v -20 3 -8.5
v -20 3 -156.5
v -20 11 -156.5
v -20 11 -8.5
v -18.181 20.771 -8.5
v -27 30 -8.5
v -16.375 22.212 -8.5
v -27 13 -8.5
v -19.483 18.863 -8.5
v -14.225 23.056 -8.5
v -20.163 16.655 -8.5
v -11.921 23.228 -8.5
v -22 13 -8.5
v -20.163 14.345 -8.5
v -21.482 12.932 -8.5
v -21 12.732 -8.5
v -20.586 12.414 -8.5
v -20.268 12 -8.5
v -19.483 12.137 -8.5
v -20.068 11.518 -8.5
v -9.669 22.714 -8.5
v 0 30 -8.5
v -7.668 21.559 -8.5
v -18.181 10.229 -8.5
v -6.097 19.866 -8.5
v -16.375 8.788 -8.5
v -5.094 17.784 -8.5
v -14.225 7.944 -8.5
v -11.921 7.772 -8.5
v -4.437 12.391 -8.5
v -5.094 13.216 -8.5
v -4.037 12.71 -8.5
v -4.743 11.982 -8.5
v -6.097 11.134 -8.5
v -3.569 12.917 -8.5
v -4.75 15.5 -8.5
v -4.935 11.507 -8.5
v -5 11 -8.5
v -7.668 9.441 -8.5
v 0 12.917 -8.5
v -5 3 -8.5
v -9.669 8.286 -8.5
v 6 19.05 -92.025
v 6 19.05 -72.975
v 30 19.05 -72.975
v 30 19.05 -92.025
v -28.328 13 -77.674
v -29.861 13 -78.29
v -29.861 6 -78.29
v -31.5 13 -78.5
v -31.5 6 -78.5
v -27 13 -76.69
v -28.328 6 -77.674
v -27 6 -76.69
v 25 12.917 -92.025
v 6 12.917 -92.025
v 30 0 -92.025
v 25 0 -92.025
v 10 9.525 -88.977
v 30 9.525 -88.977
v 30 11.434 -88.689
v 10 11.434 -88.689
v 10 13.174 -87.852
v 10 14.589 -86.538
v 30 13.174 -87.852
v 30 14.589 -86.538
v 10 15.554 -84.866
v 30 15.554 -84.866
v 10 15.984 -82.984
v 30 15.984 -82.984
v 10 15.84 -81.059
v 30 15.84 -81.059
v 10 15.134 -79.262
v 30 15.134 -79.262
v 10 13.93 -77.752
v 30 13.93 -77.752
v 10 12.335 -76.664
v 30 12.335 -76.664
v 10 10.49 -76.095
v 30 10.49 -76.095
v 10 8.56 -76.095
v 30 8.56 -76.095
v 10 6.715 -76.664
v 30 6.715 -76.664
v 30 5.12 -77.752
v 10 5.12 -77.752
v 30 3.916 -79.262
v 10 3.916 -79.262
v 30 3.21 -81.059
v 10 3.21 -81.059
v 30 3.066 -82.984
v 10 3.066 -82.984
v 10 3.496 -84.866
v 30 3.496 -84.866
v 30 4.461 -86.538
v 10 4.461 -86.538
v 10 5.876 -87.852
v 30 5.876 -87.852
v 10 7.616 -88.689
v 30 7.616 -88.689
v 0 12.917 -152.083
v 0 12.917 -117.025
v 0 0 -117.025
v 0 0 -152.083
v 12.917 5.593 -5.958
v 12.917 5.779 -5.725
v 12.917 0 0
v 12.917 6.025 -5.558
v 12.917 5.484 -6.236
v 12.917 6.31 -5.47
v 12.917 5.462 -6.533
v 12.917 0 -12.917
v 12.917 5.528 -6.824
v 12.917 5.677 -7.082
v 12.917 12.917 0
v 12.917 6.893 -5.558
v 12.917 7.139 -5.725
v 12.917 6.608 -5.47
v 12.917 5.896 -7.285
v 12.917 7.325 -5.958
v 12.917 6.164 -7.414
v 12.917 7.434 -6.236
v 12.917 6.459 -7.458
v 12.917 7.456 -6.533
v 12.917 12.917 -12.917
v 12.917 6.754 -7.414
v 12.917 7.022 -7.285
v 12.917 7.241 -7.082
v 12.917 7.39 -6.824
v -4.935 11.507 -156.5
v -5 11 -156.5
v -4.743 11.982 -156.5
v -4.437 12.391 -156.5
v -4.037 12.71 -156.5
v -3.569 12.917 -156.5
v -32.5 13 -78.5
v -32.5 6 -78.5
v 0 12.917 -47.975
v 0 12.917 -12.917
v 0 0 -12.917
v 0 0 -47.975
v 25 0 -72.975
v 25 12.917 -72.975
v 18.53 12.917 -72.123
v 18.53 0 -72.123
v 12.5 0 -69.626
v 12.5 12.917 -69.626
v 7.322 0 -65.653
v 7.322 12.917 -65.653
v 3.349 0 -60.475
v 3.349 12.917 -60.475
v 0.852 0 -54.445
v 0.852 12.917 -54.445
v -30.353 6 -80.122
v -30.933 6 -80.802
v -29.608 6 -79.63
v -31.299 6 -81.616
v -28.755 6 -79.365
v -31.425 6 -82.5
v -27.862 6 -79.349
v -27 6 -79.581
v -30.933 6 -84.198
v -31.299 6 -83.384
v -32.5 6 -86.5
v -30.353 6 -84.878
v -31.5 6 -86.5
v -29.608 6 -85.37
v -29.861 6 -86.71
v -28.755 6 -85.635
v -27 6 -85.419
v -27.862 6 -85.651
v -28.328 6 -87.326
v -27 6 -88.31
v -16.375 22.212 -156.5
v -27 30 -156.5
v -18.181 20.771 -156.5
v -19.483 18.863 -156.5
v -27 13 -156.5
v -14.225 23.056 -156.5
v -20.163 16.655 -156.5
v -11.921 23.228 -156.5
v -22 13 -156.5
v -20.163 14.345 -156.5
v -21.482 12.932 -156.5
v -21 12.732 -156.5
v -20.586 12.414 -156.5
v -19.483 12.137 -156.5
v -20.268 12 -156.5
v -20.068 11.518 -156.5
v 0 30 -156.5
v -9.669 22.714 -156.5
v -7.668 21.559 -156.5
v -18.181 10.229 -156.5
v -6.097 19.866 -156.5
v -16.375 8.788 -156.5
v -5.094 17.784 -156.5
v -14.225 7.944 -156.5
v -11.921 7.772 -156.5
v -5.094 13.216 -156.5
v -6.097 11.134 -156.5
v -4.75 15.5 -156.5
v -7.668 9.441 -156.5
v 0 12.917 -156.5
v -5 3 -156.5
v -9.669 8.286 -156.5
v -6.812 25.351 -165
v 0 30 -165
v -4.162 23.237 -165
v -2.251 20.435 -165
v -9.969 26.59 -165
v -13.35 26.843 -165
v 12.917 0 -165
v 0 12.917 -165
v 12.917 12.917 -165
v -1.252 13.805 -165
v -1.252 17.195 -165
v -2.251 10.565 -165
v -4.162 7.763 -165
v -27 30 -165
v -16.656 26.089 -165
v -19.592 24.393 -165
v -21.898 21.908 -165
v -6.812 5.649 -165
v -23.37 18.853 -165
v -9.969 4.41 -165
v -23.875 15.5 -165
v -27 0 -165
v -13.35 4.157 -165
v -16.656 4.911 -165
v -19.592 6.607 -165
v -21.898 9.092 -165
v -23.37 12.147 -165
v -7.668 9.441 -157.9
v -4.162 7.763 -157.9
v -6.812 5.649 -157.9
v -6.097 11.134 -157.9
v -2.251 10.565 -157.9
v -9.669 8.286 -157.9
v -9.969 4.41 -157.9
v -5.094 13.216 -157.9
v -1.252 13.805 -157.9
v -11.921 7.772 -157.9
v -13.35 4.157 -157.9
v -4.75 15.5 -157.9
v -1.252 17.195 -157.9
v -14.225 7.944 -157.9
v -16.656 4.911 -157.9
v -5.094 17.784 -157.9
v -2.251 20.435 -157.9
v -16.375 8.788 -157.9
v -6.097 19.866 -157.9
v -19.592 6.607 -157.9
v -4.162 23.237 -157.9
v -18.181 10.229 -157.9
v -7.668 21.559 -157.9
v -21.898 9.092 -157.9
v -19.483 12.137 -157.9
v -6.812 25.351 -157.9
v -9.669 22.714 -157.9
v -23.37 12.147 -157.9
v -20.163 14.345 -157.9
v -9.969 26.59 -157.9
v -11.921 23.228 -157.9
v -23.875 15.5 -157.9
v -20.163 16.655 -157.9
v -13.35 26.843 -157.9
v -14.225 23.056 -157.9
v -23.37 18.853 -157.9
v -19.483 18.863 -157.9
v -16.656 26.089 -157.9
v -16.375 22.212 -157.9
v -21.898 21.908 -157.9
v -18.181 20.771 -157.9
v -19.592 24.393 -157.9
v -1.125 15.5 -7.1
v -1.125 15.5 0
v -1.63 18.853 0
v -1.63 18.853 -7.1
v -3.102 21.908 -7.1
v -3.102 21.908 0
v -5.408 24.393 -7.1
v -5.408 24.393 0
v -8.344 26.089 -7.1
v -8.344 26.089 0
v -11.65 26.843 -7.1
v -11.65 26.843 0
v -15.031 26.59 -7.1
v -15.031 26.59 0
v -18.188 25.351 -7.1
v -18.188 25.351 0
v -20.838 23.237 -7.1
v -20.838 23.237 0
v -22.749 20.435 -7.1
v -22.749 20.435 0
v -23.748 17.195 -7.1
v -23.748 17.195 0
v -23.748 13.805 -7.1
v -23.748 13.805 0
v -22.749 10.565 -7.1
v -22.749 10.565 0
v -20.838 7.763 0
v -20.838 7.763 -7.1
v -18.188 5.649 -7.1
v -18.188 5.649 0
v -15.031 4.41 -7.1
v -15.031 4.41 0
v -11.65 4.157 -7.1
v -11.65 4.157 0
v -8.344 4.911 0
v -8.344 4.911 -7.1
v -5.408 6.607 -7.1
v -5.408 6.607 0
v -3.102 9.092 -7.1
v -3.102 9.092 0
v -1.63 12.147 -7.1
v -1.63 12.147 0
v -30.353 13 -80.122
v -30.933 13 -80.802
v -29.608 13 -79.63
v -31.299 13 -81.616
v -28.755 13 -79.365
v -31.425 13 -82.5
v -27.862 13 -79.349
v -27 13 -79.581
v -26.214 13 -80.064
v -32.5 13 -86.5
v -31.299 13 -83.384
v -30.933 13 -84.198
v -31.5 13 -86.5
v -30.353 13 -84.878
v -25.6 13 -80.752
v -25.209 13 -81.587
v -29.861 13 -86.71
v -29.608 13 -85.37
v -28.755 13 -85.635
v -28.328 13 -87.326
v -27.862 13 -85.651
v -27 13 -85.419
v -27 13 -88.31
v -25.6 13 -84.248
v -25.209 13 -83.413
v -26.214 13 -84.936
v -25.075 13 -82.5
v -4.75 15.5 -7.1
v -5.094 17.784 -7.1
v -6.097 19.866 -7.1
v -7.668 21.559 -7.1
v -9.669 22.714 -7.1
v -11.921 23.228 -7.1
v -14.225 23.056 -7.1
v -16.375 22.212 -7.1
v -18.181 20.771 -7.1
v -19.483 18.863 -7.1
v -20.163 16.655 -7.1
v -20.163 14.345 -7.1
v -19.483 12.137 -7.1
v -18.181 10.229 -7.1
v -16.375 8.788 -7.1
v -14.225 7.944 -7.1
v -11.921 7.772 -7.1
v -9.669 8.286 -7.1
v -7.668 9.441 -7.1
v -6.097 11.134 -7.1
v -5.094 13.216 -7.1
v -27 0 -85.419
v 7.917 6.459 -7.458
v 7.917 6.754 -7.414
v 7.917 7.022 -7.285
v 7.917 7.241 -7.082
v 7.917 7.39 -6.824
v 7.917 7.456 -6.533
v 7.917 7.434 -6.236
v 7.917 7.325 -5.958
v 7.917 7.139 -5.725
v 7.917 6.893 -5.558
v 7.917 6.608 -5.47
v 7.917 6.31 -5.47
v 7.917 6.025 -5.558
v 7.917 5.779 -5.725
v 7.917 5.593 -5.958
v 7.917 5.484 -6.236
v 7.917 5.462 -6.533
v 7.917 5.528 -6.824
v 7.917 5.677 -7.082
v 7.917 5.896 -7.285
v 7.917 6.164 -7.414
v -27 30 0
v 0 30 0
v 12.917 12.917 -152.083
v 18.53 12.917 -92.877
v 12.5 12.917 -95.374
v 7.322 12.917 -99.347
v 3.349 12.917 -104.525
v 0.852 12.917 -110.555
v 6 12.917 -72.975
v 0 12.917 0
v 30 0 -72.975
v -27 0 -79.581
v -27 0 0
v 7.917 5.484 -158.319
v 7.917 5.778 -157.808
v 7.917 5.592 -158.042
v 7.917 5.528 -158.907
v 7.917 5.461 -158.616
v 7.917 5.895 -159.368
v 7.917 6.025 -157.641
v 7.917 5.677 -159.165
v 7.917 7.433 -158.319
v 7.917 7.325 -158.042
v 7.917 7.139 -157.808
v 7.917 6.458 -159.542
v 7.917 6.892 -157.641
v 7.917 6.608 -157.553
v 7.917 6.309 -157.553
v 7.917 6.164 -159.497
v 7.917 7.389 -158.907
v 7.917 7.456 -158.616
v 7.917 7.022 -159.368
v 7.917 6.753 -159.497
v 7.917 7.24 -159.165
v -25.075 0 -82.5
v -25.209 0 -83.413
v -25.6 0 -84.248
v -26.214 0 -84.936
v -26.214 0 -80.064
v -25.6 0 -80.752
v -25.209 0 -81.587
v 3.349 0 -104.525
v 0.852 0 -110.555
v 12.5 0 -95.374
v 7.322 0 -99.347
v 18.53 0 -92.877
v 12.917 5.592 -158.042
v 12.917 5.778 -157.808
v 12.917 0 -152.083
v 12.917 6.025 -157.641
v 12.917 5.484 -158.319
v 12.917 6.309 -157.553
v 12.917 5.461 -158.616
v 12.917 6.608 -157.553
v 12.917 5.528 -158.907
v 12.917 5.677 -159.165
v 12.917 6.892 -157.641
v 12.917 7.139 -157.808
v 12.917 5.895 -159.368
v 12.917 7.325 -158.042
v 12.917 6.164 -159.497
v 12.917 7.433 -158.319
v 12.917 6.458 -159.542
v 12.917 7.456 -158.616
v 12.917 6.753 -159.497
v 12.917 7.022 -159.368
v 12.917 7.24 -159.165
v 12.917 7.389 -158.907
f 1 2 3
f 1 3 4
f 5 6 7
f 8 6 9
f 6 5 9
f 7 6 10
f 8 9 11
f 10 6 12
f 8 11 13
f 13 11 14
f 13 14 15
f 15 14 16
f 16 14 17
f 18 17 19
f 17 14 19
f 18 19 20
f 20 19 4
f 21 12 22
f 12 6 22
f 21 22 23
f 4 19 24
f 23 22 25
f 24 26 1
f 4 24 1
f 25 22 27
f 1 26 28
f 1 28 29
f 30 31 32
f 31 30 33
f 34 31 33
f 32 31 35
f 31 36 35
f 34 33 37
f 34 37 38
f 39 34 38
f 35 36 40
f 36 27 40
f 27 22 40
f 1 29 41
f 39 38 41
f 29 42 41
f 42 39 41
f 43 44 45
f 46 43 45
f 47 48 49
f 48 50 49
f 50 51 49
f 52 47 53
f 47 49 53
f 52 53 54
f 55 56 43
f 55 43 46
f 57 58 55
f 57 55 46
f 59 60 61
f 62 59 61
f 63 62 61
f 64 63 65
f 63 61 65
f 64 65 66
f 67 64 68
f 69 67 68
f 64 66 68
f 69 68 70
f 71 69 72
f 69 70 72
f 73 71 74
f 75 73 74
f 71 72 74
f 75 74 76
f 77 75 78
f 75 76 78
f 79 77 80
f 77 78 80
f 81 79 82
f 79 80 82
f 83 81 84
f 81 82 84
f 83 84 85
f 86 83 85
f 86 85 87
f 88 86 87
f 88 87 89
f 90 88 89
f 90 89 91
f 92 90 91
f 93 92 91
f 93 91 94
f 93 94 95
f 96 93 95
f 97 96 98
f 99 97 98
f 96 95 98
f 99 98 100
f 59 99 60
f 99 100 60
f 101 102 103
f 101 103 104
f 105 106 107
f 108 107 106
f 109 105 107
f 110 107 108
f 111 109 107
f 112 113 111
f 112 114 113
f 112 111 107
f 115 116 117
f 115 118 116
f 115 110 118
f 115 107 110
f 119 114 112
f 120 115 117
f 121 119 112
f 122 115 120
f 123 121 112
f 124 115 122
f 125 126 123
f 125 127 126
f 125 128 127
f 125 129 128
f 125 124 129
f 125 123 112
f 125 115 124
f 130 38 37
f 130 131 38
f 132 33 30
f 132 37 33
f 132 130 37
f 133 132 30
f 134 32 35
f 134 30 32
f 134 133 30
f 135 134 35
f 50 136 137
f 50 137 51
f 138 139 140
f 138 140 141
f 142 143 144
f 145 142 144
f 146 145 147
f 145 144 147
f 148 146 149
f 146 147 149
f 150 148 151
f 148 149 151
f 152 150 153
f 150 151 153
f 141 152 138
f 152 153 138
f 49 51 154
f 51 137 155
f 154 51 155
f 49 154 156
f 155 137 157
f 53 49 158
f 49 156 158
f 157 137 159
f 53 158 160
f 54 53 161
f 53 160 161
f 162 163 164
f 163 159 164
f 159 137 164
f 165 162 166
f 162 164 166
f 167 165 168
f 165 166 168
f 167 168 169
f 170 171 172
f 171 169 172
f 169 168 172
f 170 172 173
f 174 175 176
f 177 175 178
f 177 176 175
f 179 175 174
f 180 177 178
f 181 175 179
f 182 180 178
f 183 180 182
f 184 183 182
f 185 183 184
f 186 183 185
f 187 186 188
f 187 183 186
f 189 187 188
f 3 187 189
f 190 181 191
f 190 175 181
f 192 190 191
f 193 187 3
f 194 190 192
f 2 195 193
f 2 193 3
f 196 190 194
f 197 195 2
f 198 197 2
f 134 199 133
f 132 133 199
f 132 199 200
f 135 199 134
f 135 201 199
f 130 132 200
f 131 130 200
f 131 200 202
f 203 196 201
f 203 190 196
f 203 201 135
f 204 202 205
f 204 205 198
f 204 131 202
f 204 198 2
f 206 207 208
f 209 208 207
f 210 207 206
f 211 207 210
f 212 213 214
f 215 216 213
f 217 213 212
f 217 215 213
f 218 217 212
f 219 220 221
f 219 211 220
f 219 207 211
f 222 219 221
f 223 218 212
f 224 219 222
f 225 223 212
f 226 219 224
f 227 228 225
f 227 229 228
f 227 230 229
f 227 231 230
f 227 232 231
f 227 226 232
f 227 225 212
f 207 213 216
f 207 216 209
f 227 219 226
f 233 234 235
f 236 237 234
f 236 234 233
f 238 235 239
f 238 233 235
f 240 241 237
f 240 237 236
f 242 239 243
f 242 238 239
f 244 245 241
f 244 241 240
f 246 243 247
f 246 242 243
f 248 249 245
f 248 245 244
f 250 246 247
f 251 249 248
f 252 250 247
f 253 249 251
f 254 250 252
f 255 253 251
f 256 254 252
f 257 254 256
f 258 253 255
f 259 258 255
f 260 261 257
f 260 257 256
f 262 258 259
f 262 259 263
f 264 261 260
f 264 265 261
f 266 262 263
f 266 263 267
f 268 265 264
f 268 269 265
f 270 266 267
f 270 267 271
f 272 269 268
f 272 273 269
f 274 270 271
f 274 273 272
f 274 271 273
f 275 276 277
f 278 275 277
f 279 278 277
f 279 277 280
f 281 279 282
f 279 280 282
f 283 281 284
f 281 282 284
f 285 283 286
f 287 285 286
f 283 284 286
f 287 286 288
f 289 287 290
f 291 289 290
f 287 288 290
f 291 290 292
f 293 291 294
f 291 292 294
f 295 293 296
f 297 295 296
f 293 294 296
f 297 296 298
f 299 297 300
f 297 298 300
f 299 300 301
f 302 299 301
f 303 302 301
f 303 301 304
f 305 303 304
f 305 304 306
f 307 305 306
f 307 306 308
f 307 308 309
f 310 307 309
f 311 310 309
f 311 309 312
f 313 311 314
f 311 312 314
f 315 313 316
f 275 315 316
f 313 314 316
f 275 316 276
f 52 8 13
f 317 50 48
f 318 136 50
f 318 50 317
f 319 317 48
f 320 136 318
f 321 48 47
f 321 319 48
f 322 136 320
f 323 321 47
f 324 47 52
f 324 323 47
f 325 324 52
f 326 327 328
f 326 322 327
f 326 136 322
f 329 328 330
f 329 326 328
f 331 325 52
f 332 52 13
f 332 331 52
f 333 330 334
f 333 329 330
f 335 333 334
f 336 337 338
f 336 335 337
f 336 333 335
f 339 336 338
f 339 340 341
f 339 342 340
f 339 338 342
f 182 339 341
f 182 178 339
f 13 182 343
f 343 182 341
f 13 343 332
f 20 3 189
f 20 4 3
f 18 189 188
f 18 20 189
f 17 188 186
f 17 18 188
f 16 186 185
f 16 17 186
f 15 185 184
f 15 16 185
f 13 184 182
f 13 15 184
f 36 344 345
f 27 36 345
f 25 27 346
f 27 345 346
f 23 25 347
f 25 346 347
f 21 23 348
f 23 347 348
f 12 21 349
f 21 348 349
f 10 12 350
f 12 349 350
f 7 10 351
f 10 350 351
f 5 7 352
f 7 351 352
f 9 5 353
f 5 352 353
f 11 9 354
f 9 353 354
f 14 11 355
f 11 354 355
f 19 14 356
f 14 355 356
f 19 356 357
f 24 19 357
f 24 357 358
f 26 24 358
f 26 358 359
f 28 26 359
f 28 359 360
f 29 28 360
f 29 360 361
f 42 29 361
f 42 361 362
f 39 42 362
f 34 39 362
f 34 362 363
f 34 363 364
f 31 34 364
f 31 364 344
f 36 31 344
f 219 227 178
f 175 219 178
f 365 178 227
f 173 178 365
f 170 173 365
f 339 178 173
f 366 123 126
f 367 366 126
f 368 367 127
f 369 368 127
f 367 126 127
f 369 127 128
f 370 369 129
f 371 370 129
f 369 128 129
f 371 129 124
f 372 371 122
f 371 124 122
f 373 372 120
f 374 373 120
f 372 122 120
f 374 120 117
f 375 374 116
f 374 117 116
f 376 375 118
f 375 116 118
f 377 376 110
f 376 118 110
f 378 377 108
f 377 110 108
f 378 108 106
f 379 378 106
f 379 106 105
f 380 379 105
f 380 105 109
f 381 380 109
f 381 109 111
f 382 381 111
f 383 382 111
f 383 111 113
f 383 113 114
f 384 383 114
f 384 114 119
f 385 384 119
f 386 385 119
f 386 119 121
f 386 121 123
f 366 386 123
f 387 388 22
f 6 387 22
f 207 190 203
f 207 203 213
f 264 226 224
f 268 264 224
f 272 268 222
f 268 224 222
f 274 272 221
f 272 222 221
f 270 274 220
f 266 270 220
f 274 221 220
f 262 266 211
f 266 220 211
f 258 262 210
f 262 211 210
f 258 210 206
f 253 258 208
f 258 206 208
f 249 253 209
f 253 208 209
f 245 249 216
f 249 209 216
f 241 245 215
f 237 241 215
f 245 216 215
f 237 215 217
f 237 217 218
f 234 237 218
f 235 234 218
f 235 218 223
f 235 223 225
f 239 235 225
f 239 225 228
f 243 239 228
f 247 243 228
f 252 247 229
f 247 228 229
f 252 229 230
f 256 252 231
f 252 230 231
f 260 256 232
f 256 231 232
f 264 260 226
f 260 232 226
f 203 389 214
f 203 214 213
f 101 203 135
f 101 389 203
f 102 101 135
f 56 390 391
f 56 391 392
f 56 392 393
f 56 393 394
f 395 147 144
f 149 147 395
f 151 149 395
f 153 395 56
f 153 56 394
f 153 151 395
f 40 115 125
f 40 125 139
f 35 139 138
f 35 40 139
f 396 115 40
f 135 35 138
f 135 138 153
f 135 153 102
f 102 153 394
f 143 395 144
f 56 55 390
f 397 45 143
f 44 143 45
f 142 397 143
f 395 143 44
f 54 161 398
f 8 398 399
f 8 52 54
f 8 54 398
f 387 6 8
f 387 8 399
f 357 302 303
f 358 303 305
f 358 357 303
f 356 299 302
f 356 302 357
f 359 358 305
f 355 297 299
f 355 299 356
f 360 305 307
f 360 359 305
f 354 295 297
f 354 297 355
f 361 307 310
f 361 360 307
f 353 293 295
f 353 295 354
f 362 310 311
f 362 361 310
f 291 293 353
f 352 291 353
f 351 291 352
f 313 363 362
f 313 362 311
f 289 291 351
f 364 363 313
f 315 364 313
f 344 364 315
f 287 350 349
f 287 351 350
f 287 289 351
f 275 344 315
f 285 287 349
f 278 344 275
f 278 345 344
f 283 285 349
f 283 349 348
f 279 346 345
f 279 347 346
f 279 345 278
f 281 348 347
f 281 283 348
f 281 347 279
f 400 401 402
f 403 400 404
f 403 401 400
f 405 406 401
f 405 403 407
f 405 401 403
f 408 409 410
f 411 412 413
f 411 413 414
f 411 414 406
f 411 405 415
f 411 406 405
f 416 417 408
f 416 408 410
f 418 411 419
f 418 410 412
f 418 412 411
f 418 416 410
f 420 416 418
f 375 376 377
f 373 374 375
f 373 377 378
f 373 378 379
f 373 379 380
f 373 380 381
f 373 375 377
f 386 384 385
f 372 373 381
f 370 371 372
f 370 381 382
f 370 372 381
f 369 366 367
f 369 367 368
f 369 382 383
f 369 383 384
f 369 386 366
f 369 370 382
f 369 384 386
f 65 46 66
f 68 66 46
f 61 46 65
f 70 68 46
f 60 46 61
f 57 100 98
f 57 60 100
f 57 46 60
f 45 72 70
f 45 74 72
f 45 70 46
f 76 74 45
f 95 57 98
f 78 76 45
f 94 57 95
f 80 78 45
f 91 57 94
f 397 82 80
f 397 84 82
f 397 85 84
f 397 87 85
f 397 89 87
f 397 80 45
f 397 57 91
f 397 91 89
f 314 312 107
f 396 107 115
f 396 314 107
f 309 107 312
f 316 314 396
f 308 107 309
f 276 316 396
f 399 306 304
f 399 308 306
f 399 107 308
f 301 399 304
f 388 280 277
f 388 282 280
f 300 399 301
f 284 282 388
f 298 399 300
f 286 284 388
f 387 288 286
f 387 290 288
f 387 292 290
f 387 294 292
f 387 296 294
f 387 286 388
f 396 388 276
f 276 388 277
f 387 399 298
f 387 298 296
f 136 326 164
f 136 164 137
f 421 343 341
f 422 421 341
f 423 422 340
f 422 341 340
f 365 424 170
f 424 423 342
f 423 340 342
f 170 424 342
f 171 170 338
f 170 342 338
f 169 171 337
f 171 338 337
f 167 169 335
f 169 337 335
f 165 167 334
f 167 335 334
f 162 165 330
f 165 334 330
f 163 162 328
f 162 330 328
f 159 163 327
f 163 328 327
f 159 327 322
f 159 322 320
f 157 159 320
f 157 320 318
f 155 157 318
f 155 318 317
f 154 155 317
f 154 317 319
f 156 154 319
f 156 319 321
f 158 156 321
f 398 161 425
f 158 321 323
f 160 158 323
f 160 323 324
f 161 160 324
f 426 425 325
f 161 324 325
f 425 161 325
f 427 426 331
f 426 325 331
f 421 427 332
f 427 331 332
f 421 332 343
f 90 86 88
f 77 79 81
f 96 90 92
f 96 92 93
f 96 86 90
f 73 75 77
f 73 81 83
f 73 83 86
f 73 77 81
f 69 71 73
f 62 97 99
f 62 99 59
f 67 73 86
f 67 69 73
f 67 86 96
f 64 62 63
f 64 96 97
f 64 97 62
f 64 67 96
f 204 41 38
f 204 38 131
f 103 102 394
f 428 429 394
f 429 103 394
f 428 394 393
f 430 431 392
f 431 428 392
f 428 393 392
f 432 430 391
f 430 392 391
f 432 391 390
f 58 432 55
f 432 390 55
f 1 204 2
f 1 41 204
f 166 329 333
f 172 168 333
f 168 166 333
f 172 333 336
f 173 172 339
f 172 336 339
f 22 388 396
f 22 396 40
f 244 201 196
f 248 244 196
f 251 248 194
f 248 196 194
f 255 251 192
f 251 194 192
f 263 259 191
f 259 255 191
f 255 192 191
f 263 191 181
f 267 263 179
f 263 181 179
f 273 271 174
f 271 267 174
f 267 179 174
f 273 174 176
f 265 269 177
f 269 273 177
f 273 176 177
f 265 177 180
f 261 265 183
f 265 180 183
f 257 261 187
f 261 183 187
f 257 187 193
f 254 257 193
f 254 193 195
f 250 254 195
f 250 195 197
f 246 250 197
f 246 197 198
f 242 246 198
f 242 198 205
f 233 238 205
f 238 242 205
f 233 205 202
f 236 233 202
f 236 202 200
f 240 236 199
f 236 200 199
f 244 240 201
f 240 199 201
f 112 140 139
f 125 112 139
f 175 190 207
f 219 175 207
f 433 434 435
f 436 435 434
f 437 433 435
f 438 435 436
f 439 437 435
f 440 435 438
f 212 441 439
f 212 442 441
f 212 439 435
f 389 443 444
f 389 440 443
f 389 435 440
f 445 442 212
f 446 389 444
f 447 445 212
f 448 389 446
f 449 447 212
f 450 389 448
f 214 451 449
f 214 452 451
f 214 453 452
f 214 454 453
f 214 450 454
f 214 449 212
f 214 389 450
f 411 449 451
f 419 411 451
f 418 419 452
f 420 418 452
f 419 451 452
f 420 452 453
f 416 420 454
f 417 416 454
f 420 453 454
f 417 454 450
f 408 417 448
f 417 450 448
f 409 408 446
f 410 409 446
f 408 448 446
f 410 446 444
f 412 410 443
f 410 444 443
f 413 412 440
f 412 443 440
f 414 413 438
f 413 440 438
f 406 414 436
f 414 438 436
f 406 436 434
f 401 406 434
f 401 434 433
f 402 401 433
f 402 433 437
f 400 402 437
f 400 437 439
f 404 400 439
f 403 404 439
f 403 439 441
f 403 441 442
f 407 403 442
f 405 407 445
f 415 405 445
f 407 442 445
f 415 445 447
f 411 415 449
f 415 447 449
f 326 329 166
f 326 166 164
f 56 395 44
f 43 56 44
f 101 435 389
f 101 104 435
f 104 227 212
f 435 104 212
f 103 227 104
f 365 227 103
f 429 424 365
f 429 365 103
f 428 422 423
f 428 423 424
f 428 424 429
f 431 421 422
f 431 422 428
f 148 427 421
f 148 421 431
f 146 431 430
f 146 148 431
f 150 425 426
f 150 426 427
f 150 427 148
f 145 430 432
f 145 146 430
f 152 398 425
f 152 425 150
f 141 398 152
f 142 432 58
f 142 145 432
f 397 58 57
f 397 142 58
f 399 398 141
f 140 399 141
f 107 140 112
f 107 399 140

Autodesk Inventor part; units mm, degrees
ref_plane "YZ Plane" through (0, 0, 0) normal (1, 0, 0) x (0, 1, 0)
ref_plane "XZ Plane" through (0, 0, 0) normal (0, 1, 0) x (-1, 0, 0)
ref_plane "XY Plane" through (0, 0, 0) normal (0, 0, 1) x (1, 0, 0)
sketch "Sketch1" plane through (0, 0, 0) normal (0, 1, 0) x (-1, 0, 0)
  line L0 (0, 0) -> (25, 0)
  line L1 (25, 0) -> (25, -165)
  line L2 (25, -165) -> (0, -165)
  line L3 (0, -165) -> (0, 0)
  dimension "d0" = 25
  dimension "d1" = 165
extrude "Extrusion1" add sketch "Sketch1" along normal blind 3
sketch "Sketch2" plane through (0, 3, 0) normal (0, 1, 0) x (1, 0, 0)
  line L0 (0, 0) -> (0, 165) projected
  line L1 (-25, 165) -> (-25, 0) projected
  line L2 (0, 0) -> (-25, 0)
  line L3 (-25, 0) -> (-25, 8.5)
  line L4 (-25, 8.5) -> (0, 8.5)
  line L5 (0, 8.5) -> (0, 0)
  line L6 (-25, 165) -> (0, 165)
  line L7 (0, 165) -> (0, 156.5)
  line L8 (0, 156.5) -> (-25, 156.5)
  line L9 (-25, 156.5) -> (-25, 165)
  dimension "d4" = 8.5
  dimension "d5" = 8.5
extrude "Extrusion2" add sketch "Sketch2" along normal blind 25 contours L2 L1 L4 L0 | L8 L1 L6 L0
sketch "Sketch3" plane through (-25, 0, 0) normal (0, 0, 1) x (1, 0, 0)
  line L0 (0, 3) -> (0, 28) construction
  line L1 (25, 3) -> (25, 28) construction
  line L2 (0, 28) -> (25, 28) construction
  line L3 (25, 28) -> (25, 3) construction
  line L4 (25, 3) -> (0, 3) construction
  line L5 (0, 3) -> (0, 28) construction
  circle A0 centre (12.5, 15.5) radius 11.375
  point P0 (25, 0)
  dimension "d8" = 25
  dimension "d9" = 22.75
extrude "Extrusion3" cut sketch "Sketch3" against normal blind 7.1
sketch "Sketch4" plane through (-25, 0, 0) normal (0, 0, 1) x (1, 0, 0)
  circle A0 centre (12.5, 15.5) radius 11.375 projected
  circle A1 centre (12.5, 15.5) radius 7.75
  point P0 (25, 0)
  dimension "d12" = 15.5
extrude "Extrusion4" cut sketch "Sketch4" against normal blind 165 contours A1
sketch "Sketch5" plane through (0, 0, -165) normal (0, 0, -1) x (-1, 0, 0)
  circle A0 centre (12.5, 15.5) radius 7.75 projected
  circle A1 centre (12.5, 15.5) radius 11
  point P0 (0, 0)
extrude "Extrusion5" cut sketch "Sketch5" against normal blind 7.1
sketch "Sketch6" plane through (0, 3, 0) normal (0, 1, 0) x (1, 0, 0)
  line L0 (-25, 156.5) -> (-25, 8.5) projected
  line L1 (-20.25, 8.5) -> (-4.75, 8.5) projected
  line L2 (-25, 156.5) -> (-20, 156.5)
  line L3 (-20, 156.5) -> (-20, 8.5)
  line L4 (-20, 8.5) -> (-25, 8.5)
  line L5 (-25, 8.5) -> (-25, 156.5)
  line L6 (0, 8.5) -> (0, 156.5) projected
  line L7 (-4.75, 156.5) -> (-20.25, 156.5) projected
  line L8 (0, 8.5) -> (-5, 8.5)
  line L9 (-5, 8.5) -> (-5, 156.5)
  line L10 (-5, 156.5) -> (0, 156.5)
  line L11 (0, 156.5) -> (0, 8.5)
  point P0 (0, 0)
  dimension "d17" = 5
  dimension "d18" = 5
extrude "Extrusion6" add sketch "Sketch6" along normal blind 10 contours L2 L3 L1 L4 L0 | L7 L10 L6 L8 L1 L9
fillet "Fillet1" radius 2 2 edges at (-5, 13, -82.5) (-20, 13, -82.5)
sketch "Sketch7" plane through (0, 0, 0) normal (1, 0, 0) x (0, 0, -1)
  line L0 (165, 0) -> (0, 0) projected
  line L1 (0, 0) -> (16, 0)
  line L2 (16, 0) -> (16, 8)
  line L3 (16, 8) -> (0, 8)
  line L4 (0, 8) -> (0, 0)
  line L5 (165, 0) -> (149, 0)
  line L6 (149, 0) -> (149, 8)
  line L7 (149, 8) -> (165, 8)
  line L8 (165, 8) -> (165, 0)
  line L9 (0, 28) -> (8.5, 28) projected
  line L10 (0, 28) -> (16, 28)
  line L11 (16, 28) -> (16, 20)
  line L12 (16, 20) -> (0, 20)
  line L13 (0, 20) -> (0, 28)
  line L14 (165, 0) -> (165, 28) projected
  line L15 (165, 28) -> (149, 28)
  line L16 (149, 28) -> (149, 20)
  line L17 (149, 20) -> (165, 20)
  line L18 (165, 20) -> (165, 28)
  dimension "d22" = 16
  dimension "d23" = 8
  dimension "d24" = 16
  dimension "d25" = 16
  dimension "d26" = 8
extrude "Extrusion7" add sketch "Sketch7" along normal blind 45
fillet "Fillet2" radius 6 2 edges at (0, 24, -156.5) (0, 24, -8.5)
sketch "Sketch8" plane through (45, 0, 0) normal (1, 0, 0) x (0, 0, -1)
  line L0 (8.5, 20) -> (0, 20) construction
  line L1 (16, 28) -> (16, 20) construction
  line L2 (0, 20) -> (16, 28) construction
  line L3 (0, 0) -> (165, 0) construction
  line L4 (16, 8) -> (16, 0) construction
  line L5 (0, 0) -> (16, 8) construction
  line L6 (150.5, 28) -> (149, 28) construction
  line L7 (165, 8) -> (165, 20) construction
  line L8 (149, 28) -> (165, 20) construction
  line L9 (149, 0) -> (149, 8) construction
  line L10 (149, 8) -> (165, 0) construction
  line L11 (163.125, 22.25) -> (150.875, 22.25)
  line L12 (150.875, 22.25) -> (150.875, 25.75)
  line L13 (150.875, 25.75) -> (163.125, 25.75)
  line L14 (163.125, 25.75) -> (163.125, 22.25)
  line L15 (163.125, 22.25) -> (150.875, 25.75) construction
  line L16 (150.875, 22.25) -> (163.125, 25.75) construction
  line L17 (163.125, 2.25) -> (150.875, 2.25)
  line L18 (150.875, 2.25) -> (150.875, 5.75)
  line L19 (150.875, 5.75) -> (163.125, 5.75)
  line L20 (163.125, 5.75) -> (163.125, 2.25)
  line L21 (163.125, 2.25) -> (150.875, 5.75) construction
  line L22 (150.875, 2.25) -> (163.125, 5.75) construction
  line L23 (14.125, 22.25) -> (1.875, 22.25)
  line L24 (1.875, 22.25) -> (1.875, 25.75)
  line L25 (1.875, 25.75) -> (14.125, 25.75)
  line L26 (14.125, 25.75) -> (14.125, 22.25)
  line L27 (14.125, 22.25) -> (1.875, 25.75) construction
  line L28 (1.875, 22.25) -> (14.125, 25.75) construction
  line L29 (14.125, 2.25) -> (1.875, 2.25)
  line L30 (1.875, 2.25) -> (1.875, 5.75)
  line L31 (1.875, 5.75) -> (14.125, 5.75)
  line L32 (14.125, 5.75) -> (14.125, 2.25)
  line L33 (14.125, 2.25) -> (1.875, 5.75) construction
  line L34 (1.875, 2.25) -> (14.125, 5.75) construction
  point P0 (157, 24)
  point P1 (157, 4)
  point P2 (8, 24)
  point P3 (8, 4)
  dimension "d30" = 12.25
  dimension "d31" = 3.5
  dimension "d32" = 12.25
  dimension "d33" = 3.5
  dimension "d34" = 12.25
  dimension "d35" = 12.25
  dimension "d36" = 3.5
extrude "Extrusion8" cut sketch "Sketch8" against normal blind 40
sketch "Sketch9" plane through (0, 8, 0) normal (0, 1, 0) x (1, 0, 0)
  line L0 (0, 0) -> (0, 16) construction
  line L1 (0, 8) -> (0, 9) construction
  line L2 (45, 1.875) -> (45, 14.125) construction
  line L3 (0, 9) -> (45, 9) construction
  line L4 (45, 9) -> (45, 7) construction
  line L5 (45, 7) -> (0, 7) construction
  line L6 (0, 7) -> (0, 9) construction
  line L7 (0, 9) -> (45, 9)
  line L8 (45, 9) -> (45, 7)
  line L9 (45, 7) -> (0, 7)
  line L10 (0, 7) -> (0, 9)
  line L11 (0, 149) -> (0, 165) construction
  line L12 (0, 149) -> (0, 157) construction
  line L13 (0, 157) -> (0, 158) construction
  line L14 (45, 165) -> (45, 149) projected
  line L15 (0, 158) -> (45, 158)
  line L16 (45, 158) -> (45, 156)
  line L17 (45, 156) -> (0, 156)
  line L18 (0, 156) -> (0, 158)
  dimension "d39" = 1
  dimension "d40" = 2
  dimension "d41" = 8
  dimension "d42" = 1
  dimension "d43" = 2
extrude "Extrusion9" add sketch "Sketch9" along normal blind 12
fillet "Fillet3" radius 6 2 edges at (0, 16.5, -156.5) (0, 16.5, -8.5)
sketch "Sketch10" plane through (-25, 0, -165) normal (-1, 0, 0) x (0, 0, 1)
  line L0 (165, 0) -> (0, 0) construction
  line L1 (82.5, 0) -> (82.5, 6) construction
  line L2 (156.5, 13) -> (8.5, 13) construction
  line L3 (82.5, 6) -> (86.5, 6) construction
  line L4 (86.5, 6) -> (86.5, 13) construction
  line L5 (86.5, 13) -> (82.5, 13) construction
  line L6 (82.5, 13) -> (82.5, 6) construction
  line L7 (86.5, 6) -> (78.5, 6)
  line L8 (78.5, 6) -> (78.5, 13)
  line L9 (78.5, 13) -> (86.5, 13)
  line L10 (86.5, 13) -> (86.5, 6)
  dimension "d47" = 6
  dimension "d48" = 4
  dimension "d49" = 8
extrude "Extrusion10" add sketch "Sketch10" along normal blind 6.5
sketch "Sketch11" plane through (0, 13, 0) normal (0, 1, 0) x (1, 0, 0)
  line L0 (-25, 156.5) -> (-25, 86.5) construction
  line L1 (-31.5, 78.5) -> (-31.5, 86.5) construction
  line L2 (-25, 86.5) -> (-31.5, 78.5) construction
  circle A0 centre (-28.25, 82.5) radius 3.175
  point P0 (0, 0)
  dimension "d52" = 6.35
extrude "Extrusion11" cut sketch "Sketch11" against normal blind 8
fillet "Fillet4" radius 6.5 2 edges at (-25, 9.5, -86.5) (-25, 9.5, -78.5)
sketch "Sketch12" plane through (-25, 0, 0) normal (0, 0, 1) x (1, 0, 0)
  circle A0 centre (12.5, 15.5) radius 7.75 construction
  circle A1 centre (12.5, 15.5) radius 23.5 construction
  line L0 (25, 20) -> (70, 20) projected
  arc A2 (70, 20) -> (25, 0) centre (68.4414, -37.118) ccw
  line L1 (70, 8) -> (70, 0) projected
  line L2 (25, 0) -> (70, 0)
  line L3 (70, 0) -> (70, 20)
  dimension "d56" = 47
sketch "Sketch13" plane through (0, 13, 0) normal (0, 1, 0) x (1, 0, 0)
  line L0 (-31.5, 86.5) -> (-31.5, 78.5) projected
  line L1 (-31.5, 86.5) -> (-32.5, 86.5)
  line L2 (-32.5, 86.5) -> (-32.5, 78.5)
  line L3 (-32.5, 78.5) -> (-31.5, 78.5)
  line L4 (-31.5, 78.5) -> (-31.5, 86.5)
  point P0 (0, 0)
  dimension "d57" = 1
extrude "Extrusion12" add sketch "Sketch13" against normal blind 7
sketch "Sketch14" plane through (-25, 0, -165) normal (0, 0, -1) x (-1, 0, 0)
  circle A0 centre (-12.5, 15.5) radius 11.375 projected
  circle A1 centre (-12.5, 15.5) radius 11.375
  point P0 (-25, 0)
extrude "Extrusion13" cut sketch "Sketch14" against normal blind 7.1
sketch "Sketch15" plane through (0, 8, 0) normal (0, 1, 0) x (1, 0, 0)
  line L0 (0, 16) -> (45, 16) projected
  line L1 (0, 0) -> (45, 0)
  line L2 (45, 0) -> (45, 16)
  line L3 (45, 16) -> (0, 16)
  line L4 (0, 16) -> (0, 0)
  line L5 (0, 149) -> (45, 149) projected
  line L6 (0, 149) -> (45, 149)
  line L7 (45, 149) -> (45, 165)
  line L8 (45, 165) -> (0, 165)
  line L9 (0, 165) -> (0, 149)
extrude "Extrusion14" add sketch "Sketch15" along normal blind 14.5
sketch "Sketch16" plane through (-25, 0, 0) normal (0, 0, 1) x (1, 0, 0)
  point P0 (25, 0)
sketch "Sketch17" plane through (0, 28, 0) normal (0, 1, 0) x (1, 0, 0)
  line L0 (-25, 0) -> (0, 0)
  line L1 (0, 0) -> (0, 8.5)
  line L2 (0, 8.5) -> (-25, 8.5)
  line L3 (-25, 8.5) -> (-25, 0)
  line L4 (0, 16) -> (45, 16) projected
  line L5 (0, 0) -> (45, 0)
  line L6 (45, 0) -> (45, 16)
  line L7 (45, 16) -> (0, 16)
  line L8 (0, 16) -> (0, 0)
  line L9 (0, 150.5) -> (0, 149) projected
  line L10 (-25, 165) -> (45, 165) projected
  line L11 (0, 149) -> (45, 149)
  line L12 (45, 149) -> (45, 165)
  line L13 (45, 165) -> (0, 165)
  line L14 (0, 165) -> (0, 149)
  line L15 (-25, 156.5) -> (-25, 93) projected
  line L16 (-25, 156.5) -> (0, 156.5)
  line L17 (0, 156.5) -> (0, 165)
  line L18 (0, 165) -> (-25, 165)
  line L19 (-25, 165) -> (-25, 156.5)
  arc A0 (0, 150.5) -> (-6, 156.5) centre (-6, 150.5) ccw projected
  arc A1 (0, 150.5) -> (-6, 156.5) centre (-6, 150.5) ccw
  arc A2 (-6, 8.5) -> (0, 14.5) centre (-6, 14.5) ccw projected
  arc A3 (-6, 8.5) -> (0, 14.5) centre (-6, 14.5) ccw
extrude "Extrusion15" add sketch "Sketch17" along normal blind 2
sketch "Sketch18" plane through (-25, 0, -165) normal (-1, 0, 0) x (0, 0, 1)
  line L0 (165, 0) -> (165, 30) projected
  line L1 (165, 0) -> (0, 0) projected
  line L2 (165, 30) -> (156.5, 30)
  line L3 (156.5, 30) -> (156.5, 0)
  line L4 (156.5, 0) -> (165, 0)
  line L5 (165, 0) -> (165, 30)
  line L6 (8.5, 30) -> (8.5, 20) projected
  line L7 (0, 0) -> (0, 30) projected
  line L8 (8.5, 30) -> (0, 30)
  line L9 (0, 30) -> (0, 0)
  line L10 (0, 0) -> (8.5, 0)
  line L11 (8.5, 0) -> (8.5, 30)
  line L12 (93, 13) -> (156.5, 13) projected
  line L13 (8.5, 0) -> (156.5, 0)
  line L14 (156.5, 0) -> (156.5, 13)
  line L15 (156.5, 13) -> (8.5, 13)
  line L16 (8.5, 13) -> (8.5, 0)
  dimension "d66" = 8.5
extrude "Extrusion16" add sketch "Sketch18" along normal blind 2
sketch "Sketch19" plane through (0, 13, 0) normal (0, 1, 0) x (1, 0, 0)
  arc A0 (-27, 85.4186) -> (-27, 79.5814) centre (-28.25, 82.5) ccw projected
  circle A1 centre (-28.25, 82.5) radius 3.175
  point P0 (0, 0)
extrude "Extrusion17" cut sketch "Sketch19" against normal blind 20
extrude "Extrusion18" cut sketch "Sketch12" against normal blind 165
sketch "Sketch20" plane through (0, 13, -16) normal (1, 0, 0) x (0, 0, -1)
  line L0 (-19.7473, 36.8678) -> (154.646, 36.8678)
  line L1 (154.646, 36.8678) -> (154.646, -33.1777)
  line L2 (154.646, -33.1777) -> (-19.7473, -33.1777)
  line L3 (-19.7473, -33.1777) -> (-19.7473, 36.8678)
  point P0 (-16, -13)
extrude "Extrusion19" cut sketch "Sketch20" along normal blind 47
sketch "Sketch21" plane through (-5, 3, -8.5) normal (0, 0, -1) x (-1, 0, 0)
  line L0 (1, 17) -> (1, 27) projected
  line L1 (1, 27) -> (-5, 27)
  line L2 (-5, 27) -> (-5, 9.9174)
  line L3 (-5, 9.9174) -> (1, 9.9174)
  line L4 (1, 9.9174) -> (1, 27)
  point P0 (-5, -3)
  dimension "d75" = 6
extrude "Extrusion20" cut sketch "Sketch21" along normal blind 148
sketch "Sketch22" plane through (0, 0, 0) normal (0, -1, 0) x (1, 0, 0)
  line L0 (-30, -92.025) -> (30, -92.025)
  line L1 (30, -92.025) -> (30, -72.975)
  line L2 (30, -72.975) -> (-30, -72.975)
  line L3 (-30, -72.975) -> (-30, -92.025)
  line L4 (0, -165) -> (0, 0) projected
  line L5 (-30, -92.025) -> (30, -72.975) construction
  line L6 (30, -92.025) -> (-30, -72.975) construction
  point P0 (0, -82.5)
  point P1 (0, -72.975)
  point P2 (0, -92.025)
  dimension "d78" = 60
  dimension "d79" = 19.05
extrude "Extrusion21" add sketch "Sketch22" against normal blind 19.05 contours L4 L2 L1 L0
fillet "Fillet5" radius 25 2 edges at (0, 6.4587, -72.975) (0, 6.4587, -92.025)
sketch "Sketch23" plane through (0, 19.05, -72.975) normal (0, 0, 1) x (1, 0, 0)
  line L0 (0, -6.1326) -> (25, -6.1326) projected
  line L1 (0, 0) -> (30, 0) projected
  line L2 (0, -6.1326) -> (6, -6.1326)
  line L3 (6, -6.1326) -> (6, 0)
  line L4 (6, 0) -> (0, 0)
  line L5 (0, 0) -> (0, -6.1326)
  point P0 (0, -19.05)
  dimension "d83" = 6
extrude "Extrusion22" cut sketch "Sketch23" against normal blind 26.8
sketch "Sketch24" plane through (30, 0, -72.975) normal (1, 0, 0) x (0, 0, -1)
  circle A0 centre (9.525, 9.525) radius 6.477
  point P0 (-72.975, 0)
  dimension "d86" = 12.954
extrude "Extrusion23" cut sketch "Sketch24" against normal blind 20
sketch "Sketch25" plane through (0, 0, 0) normal (1, 0, 0) x (0, 0, -1)
  line L0 (0, 0) -> (0, 30) projected
  line L1 (47.975, 12.9174) -> (8.5, 12.9174) projected
  line L2 (0, 0) -> (12.917, 0)
  line L3 (12.917, 0) -> (12.917, 12.9174)
  line L4 (12.917, 12.9174) -> (0, 12.9174)
  line L5 (0, 12.9174) -> (0, 0)
  line L6 (165, 0) -> (152.083, 0)
  line L7 (152.083, 0) -> (152.083, 12.9174)
  line L8 (152.083, 12.9174) -> (165, 12.9174)
  line L9 (165, 12.9174) -> (165, 0)
  dimension "d89" = 12.917
  dimension "d90" = 12.917
extrude "Extrusion24" add sketch "Sketch25" along normal blind 12.917
sketch "Sketch26" plane through (12.917, 0, 0) normal (1, 0, 0) x (0, 0, -1)
  circle A0 centre (6.4585, 6.459) radius 1
  circle A1 centre (158.5415, 6.4585) radius 1
  point P0 (0, 0)
  dimension "d93" = 2
  dimension "d94" = 2
extrude "Extrusion25" cut sketch "Sketch26" against normal blind 5
properties part number "frontAxelHolder 10-24_3DPrint"
